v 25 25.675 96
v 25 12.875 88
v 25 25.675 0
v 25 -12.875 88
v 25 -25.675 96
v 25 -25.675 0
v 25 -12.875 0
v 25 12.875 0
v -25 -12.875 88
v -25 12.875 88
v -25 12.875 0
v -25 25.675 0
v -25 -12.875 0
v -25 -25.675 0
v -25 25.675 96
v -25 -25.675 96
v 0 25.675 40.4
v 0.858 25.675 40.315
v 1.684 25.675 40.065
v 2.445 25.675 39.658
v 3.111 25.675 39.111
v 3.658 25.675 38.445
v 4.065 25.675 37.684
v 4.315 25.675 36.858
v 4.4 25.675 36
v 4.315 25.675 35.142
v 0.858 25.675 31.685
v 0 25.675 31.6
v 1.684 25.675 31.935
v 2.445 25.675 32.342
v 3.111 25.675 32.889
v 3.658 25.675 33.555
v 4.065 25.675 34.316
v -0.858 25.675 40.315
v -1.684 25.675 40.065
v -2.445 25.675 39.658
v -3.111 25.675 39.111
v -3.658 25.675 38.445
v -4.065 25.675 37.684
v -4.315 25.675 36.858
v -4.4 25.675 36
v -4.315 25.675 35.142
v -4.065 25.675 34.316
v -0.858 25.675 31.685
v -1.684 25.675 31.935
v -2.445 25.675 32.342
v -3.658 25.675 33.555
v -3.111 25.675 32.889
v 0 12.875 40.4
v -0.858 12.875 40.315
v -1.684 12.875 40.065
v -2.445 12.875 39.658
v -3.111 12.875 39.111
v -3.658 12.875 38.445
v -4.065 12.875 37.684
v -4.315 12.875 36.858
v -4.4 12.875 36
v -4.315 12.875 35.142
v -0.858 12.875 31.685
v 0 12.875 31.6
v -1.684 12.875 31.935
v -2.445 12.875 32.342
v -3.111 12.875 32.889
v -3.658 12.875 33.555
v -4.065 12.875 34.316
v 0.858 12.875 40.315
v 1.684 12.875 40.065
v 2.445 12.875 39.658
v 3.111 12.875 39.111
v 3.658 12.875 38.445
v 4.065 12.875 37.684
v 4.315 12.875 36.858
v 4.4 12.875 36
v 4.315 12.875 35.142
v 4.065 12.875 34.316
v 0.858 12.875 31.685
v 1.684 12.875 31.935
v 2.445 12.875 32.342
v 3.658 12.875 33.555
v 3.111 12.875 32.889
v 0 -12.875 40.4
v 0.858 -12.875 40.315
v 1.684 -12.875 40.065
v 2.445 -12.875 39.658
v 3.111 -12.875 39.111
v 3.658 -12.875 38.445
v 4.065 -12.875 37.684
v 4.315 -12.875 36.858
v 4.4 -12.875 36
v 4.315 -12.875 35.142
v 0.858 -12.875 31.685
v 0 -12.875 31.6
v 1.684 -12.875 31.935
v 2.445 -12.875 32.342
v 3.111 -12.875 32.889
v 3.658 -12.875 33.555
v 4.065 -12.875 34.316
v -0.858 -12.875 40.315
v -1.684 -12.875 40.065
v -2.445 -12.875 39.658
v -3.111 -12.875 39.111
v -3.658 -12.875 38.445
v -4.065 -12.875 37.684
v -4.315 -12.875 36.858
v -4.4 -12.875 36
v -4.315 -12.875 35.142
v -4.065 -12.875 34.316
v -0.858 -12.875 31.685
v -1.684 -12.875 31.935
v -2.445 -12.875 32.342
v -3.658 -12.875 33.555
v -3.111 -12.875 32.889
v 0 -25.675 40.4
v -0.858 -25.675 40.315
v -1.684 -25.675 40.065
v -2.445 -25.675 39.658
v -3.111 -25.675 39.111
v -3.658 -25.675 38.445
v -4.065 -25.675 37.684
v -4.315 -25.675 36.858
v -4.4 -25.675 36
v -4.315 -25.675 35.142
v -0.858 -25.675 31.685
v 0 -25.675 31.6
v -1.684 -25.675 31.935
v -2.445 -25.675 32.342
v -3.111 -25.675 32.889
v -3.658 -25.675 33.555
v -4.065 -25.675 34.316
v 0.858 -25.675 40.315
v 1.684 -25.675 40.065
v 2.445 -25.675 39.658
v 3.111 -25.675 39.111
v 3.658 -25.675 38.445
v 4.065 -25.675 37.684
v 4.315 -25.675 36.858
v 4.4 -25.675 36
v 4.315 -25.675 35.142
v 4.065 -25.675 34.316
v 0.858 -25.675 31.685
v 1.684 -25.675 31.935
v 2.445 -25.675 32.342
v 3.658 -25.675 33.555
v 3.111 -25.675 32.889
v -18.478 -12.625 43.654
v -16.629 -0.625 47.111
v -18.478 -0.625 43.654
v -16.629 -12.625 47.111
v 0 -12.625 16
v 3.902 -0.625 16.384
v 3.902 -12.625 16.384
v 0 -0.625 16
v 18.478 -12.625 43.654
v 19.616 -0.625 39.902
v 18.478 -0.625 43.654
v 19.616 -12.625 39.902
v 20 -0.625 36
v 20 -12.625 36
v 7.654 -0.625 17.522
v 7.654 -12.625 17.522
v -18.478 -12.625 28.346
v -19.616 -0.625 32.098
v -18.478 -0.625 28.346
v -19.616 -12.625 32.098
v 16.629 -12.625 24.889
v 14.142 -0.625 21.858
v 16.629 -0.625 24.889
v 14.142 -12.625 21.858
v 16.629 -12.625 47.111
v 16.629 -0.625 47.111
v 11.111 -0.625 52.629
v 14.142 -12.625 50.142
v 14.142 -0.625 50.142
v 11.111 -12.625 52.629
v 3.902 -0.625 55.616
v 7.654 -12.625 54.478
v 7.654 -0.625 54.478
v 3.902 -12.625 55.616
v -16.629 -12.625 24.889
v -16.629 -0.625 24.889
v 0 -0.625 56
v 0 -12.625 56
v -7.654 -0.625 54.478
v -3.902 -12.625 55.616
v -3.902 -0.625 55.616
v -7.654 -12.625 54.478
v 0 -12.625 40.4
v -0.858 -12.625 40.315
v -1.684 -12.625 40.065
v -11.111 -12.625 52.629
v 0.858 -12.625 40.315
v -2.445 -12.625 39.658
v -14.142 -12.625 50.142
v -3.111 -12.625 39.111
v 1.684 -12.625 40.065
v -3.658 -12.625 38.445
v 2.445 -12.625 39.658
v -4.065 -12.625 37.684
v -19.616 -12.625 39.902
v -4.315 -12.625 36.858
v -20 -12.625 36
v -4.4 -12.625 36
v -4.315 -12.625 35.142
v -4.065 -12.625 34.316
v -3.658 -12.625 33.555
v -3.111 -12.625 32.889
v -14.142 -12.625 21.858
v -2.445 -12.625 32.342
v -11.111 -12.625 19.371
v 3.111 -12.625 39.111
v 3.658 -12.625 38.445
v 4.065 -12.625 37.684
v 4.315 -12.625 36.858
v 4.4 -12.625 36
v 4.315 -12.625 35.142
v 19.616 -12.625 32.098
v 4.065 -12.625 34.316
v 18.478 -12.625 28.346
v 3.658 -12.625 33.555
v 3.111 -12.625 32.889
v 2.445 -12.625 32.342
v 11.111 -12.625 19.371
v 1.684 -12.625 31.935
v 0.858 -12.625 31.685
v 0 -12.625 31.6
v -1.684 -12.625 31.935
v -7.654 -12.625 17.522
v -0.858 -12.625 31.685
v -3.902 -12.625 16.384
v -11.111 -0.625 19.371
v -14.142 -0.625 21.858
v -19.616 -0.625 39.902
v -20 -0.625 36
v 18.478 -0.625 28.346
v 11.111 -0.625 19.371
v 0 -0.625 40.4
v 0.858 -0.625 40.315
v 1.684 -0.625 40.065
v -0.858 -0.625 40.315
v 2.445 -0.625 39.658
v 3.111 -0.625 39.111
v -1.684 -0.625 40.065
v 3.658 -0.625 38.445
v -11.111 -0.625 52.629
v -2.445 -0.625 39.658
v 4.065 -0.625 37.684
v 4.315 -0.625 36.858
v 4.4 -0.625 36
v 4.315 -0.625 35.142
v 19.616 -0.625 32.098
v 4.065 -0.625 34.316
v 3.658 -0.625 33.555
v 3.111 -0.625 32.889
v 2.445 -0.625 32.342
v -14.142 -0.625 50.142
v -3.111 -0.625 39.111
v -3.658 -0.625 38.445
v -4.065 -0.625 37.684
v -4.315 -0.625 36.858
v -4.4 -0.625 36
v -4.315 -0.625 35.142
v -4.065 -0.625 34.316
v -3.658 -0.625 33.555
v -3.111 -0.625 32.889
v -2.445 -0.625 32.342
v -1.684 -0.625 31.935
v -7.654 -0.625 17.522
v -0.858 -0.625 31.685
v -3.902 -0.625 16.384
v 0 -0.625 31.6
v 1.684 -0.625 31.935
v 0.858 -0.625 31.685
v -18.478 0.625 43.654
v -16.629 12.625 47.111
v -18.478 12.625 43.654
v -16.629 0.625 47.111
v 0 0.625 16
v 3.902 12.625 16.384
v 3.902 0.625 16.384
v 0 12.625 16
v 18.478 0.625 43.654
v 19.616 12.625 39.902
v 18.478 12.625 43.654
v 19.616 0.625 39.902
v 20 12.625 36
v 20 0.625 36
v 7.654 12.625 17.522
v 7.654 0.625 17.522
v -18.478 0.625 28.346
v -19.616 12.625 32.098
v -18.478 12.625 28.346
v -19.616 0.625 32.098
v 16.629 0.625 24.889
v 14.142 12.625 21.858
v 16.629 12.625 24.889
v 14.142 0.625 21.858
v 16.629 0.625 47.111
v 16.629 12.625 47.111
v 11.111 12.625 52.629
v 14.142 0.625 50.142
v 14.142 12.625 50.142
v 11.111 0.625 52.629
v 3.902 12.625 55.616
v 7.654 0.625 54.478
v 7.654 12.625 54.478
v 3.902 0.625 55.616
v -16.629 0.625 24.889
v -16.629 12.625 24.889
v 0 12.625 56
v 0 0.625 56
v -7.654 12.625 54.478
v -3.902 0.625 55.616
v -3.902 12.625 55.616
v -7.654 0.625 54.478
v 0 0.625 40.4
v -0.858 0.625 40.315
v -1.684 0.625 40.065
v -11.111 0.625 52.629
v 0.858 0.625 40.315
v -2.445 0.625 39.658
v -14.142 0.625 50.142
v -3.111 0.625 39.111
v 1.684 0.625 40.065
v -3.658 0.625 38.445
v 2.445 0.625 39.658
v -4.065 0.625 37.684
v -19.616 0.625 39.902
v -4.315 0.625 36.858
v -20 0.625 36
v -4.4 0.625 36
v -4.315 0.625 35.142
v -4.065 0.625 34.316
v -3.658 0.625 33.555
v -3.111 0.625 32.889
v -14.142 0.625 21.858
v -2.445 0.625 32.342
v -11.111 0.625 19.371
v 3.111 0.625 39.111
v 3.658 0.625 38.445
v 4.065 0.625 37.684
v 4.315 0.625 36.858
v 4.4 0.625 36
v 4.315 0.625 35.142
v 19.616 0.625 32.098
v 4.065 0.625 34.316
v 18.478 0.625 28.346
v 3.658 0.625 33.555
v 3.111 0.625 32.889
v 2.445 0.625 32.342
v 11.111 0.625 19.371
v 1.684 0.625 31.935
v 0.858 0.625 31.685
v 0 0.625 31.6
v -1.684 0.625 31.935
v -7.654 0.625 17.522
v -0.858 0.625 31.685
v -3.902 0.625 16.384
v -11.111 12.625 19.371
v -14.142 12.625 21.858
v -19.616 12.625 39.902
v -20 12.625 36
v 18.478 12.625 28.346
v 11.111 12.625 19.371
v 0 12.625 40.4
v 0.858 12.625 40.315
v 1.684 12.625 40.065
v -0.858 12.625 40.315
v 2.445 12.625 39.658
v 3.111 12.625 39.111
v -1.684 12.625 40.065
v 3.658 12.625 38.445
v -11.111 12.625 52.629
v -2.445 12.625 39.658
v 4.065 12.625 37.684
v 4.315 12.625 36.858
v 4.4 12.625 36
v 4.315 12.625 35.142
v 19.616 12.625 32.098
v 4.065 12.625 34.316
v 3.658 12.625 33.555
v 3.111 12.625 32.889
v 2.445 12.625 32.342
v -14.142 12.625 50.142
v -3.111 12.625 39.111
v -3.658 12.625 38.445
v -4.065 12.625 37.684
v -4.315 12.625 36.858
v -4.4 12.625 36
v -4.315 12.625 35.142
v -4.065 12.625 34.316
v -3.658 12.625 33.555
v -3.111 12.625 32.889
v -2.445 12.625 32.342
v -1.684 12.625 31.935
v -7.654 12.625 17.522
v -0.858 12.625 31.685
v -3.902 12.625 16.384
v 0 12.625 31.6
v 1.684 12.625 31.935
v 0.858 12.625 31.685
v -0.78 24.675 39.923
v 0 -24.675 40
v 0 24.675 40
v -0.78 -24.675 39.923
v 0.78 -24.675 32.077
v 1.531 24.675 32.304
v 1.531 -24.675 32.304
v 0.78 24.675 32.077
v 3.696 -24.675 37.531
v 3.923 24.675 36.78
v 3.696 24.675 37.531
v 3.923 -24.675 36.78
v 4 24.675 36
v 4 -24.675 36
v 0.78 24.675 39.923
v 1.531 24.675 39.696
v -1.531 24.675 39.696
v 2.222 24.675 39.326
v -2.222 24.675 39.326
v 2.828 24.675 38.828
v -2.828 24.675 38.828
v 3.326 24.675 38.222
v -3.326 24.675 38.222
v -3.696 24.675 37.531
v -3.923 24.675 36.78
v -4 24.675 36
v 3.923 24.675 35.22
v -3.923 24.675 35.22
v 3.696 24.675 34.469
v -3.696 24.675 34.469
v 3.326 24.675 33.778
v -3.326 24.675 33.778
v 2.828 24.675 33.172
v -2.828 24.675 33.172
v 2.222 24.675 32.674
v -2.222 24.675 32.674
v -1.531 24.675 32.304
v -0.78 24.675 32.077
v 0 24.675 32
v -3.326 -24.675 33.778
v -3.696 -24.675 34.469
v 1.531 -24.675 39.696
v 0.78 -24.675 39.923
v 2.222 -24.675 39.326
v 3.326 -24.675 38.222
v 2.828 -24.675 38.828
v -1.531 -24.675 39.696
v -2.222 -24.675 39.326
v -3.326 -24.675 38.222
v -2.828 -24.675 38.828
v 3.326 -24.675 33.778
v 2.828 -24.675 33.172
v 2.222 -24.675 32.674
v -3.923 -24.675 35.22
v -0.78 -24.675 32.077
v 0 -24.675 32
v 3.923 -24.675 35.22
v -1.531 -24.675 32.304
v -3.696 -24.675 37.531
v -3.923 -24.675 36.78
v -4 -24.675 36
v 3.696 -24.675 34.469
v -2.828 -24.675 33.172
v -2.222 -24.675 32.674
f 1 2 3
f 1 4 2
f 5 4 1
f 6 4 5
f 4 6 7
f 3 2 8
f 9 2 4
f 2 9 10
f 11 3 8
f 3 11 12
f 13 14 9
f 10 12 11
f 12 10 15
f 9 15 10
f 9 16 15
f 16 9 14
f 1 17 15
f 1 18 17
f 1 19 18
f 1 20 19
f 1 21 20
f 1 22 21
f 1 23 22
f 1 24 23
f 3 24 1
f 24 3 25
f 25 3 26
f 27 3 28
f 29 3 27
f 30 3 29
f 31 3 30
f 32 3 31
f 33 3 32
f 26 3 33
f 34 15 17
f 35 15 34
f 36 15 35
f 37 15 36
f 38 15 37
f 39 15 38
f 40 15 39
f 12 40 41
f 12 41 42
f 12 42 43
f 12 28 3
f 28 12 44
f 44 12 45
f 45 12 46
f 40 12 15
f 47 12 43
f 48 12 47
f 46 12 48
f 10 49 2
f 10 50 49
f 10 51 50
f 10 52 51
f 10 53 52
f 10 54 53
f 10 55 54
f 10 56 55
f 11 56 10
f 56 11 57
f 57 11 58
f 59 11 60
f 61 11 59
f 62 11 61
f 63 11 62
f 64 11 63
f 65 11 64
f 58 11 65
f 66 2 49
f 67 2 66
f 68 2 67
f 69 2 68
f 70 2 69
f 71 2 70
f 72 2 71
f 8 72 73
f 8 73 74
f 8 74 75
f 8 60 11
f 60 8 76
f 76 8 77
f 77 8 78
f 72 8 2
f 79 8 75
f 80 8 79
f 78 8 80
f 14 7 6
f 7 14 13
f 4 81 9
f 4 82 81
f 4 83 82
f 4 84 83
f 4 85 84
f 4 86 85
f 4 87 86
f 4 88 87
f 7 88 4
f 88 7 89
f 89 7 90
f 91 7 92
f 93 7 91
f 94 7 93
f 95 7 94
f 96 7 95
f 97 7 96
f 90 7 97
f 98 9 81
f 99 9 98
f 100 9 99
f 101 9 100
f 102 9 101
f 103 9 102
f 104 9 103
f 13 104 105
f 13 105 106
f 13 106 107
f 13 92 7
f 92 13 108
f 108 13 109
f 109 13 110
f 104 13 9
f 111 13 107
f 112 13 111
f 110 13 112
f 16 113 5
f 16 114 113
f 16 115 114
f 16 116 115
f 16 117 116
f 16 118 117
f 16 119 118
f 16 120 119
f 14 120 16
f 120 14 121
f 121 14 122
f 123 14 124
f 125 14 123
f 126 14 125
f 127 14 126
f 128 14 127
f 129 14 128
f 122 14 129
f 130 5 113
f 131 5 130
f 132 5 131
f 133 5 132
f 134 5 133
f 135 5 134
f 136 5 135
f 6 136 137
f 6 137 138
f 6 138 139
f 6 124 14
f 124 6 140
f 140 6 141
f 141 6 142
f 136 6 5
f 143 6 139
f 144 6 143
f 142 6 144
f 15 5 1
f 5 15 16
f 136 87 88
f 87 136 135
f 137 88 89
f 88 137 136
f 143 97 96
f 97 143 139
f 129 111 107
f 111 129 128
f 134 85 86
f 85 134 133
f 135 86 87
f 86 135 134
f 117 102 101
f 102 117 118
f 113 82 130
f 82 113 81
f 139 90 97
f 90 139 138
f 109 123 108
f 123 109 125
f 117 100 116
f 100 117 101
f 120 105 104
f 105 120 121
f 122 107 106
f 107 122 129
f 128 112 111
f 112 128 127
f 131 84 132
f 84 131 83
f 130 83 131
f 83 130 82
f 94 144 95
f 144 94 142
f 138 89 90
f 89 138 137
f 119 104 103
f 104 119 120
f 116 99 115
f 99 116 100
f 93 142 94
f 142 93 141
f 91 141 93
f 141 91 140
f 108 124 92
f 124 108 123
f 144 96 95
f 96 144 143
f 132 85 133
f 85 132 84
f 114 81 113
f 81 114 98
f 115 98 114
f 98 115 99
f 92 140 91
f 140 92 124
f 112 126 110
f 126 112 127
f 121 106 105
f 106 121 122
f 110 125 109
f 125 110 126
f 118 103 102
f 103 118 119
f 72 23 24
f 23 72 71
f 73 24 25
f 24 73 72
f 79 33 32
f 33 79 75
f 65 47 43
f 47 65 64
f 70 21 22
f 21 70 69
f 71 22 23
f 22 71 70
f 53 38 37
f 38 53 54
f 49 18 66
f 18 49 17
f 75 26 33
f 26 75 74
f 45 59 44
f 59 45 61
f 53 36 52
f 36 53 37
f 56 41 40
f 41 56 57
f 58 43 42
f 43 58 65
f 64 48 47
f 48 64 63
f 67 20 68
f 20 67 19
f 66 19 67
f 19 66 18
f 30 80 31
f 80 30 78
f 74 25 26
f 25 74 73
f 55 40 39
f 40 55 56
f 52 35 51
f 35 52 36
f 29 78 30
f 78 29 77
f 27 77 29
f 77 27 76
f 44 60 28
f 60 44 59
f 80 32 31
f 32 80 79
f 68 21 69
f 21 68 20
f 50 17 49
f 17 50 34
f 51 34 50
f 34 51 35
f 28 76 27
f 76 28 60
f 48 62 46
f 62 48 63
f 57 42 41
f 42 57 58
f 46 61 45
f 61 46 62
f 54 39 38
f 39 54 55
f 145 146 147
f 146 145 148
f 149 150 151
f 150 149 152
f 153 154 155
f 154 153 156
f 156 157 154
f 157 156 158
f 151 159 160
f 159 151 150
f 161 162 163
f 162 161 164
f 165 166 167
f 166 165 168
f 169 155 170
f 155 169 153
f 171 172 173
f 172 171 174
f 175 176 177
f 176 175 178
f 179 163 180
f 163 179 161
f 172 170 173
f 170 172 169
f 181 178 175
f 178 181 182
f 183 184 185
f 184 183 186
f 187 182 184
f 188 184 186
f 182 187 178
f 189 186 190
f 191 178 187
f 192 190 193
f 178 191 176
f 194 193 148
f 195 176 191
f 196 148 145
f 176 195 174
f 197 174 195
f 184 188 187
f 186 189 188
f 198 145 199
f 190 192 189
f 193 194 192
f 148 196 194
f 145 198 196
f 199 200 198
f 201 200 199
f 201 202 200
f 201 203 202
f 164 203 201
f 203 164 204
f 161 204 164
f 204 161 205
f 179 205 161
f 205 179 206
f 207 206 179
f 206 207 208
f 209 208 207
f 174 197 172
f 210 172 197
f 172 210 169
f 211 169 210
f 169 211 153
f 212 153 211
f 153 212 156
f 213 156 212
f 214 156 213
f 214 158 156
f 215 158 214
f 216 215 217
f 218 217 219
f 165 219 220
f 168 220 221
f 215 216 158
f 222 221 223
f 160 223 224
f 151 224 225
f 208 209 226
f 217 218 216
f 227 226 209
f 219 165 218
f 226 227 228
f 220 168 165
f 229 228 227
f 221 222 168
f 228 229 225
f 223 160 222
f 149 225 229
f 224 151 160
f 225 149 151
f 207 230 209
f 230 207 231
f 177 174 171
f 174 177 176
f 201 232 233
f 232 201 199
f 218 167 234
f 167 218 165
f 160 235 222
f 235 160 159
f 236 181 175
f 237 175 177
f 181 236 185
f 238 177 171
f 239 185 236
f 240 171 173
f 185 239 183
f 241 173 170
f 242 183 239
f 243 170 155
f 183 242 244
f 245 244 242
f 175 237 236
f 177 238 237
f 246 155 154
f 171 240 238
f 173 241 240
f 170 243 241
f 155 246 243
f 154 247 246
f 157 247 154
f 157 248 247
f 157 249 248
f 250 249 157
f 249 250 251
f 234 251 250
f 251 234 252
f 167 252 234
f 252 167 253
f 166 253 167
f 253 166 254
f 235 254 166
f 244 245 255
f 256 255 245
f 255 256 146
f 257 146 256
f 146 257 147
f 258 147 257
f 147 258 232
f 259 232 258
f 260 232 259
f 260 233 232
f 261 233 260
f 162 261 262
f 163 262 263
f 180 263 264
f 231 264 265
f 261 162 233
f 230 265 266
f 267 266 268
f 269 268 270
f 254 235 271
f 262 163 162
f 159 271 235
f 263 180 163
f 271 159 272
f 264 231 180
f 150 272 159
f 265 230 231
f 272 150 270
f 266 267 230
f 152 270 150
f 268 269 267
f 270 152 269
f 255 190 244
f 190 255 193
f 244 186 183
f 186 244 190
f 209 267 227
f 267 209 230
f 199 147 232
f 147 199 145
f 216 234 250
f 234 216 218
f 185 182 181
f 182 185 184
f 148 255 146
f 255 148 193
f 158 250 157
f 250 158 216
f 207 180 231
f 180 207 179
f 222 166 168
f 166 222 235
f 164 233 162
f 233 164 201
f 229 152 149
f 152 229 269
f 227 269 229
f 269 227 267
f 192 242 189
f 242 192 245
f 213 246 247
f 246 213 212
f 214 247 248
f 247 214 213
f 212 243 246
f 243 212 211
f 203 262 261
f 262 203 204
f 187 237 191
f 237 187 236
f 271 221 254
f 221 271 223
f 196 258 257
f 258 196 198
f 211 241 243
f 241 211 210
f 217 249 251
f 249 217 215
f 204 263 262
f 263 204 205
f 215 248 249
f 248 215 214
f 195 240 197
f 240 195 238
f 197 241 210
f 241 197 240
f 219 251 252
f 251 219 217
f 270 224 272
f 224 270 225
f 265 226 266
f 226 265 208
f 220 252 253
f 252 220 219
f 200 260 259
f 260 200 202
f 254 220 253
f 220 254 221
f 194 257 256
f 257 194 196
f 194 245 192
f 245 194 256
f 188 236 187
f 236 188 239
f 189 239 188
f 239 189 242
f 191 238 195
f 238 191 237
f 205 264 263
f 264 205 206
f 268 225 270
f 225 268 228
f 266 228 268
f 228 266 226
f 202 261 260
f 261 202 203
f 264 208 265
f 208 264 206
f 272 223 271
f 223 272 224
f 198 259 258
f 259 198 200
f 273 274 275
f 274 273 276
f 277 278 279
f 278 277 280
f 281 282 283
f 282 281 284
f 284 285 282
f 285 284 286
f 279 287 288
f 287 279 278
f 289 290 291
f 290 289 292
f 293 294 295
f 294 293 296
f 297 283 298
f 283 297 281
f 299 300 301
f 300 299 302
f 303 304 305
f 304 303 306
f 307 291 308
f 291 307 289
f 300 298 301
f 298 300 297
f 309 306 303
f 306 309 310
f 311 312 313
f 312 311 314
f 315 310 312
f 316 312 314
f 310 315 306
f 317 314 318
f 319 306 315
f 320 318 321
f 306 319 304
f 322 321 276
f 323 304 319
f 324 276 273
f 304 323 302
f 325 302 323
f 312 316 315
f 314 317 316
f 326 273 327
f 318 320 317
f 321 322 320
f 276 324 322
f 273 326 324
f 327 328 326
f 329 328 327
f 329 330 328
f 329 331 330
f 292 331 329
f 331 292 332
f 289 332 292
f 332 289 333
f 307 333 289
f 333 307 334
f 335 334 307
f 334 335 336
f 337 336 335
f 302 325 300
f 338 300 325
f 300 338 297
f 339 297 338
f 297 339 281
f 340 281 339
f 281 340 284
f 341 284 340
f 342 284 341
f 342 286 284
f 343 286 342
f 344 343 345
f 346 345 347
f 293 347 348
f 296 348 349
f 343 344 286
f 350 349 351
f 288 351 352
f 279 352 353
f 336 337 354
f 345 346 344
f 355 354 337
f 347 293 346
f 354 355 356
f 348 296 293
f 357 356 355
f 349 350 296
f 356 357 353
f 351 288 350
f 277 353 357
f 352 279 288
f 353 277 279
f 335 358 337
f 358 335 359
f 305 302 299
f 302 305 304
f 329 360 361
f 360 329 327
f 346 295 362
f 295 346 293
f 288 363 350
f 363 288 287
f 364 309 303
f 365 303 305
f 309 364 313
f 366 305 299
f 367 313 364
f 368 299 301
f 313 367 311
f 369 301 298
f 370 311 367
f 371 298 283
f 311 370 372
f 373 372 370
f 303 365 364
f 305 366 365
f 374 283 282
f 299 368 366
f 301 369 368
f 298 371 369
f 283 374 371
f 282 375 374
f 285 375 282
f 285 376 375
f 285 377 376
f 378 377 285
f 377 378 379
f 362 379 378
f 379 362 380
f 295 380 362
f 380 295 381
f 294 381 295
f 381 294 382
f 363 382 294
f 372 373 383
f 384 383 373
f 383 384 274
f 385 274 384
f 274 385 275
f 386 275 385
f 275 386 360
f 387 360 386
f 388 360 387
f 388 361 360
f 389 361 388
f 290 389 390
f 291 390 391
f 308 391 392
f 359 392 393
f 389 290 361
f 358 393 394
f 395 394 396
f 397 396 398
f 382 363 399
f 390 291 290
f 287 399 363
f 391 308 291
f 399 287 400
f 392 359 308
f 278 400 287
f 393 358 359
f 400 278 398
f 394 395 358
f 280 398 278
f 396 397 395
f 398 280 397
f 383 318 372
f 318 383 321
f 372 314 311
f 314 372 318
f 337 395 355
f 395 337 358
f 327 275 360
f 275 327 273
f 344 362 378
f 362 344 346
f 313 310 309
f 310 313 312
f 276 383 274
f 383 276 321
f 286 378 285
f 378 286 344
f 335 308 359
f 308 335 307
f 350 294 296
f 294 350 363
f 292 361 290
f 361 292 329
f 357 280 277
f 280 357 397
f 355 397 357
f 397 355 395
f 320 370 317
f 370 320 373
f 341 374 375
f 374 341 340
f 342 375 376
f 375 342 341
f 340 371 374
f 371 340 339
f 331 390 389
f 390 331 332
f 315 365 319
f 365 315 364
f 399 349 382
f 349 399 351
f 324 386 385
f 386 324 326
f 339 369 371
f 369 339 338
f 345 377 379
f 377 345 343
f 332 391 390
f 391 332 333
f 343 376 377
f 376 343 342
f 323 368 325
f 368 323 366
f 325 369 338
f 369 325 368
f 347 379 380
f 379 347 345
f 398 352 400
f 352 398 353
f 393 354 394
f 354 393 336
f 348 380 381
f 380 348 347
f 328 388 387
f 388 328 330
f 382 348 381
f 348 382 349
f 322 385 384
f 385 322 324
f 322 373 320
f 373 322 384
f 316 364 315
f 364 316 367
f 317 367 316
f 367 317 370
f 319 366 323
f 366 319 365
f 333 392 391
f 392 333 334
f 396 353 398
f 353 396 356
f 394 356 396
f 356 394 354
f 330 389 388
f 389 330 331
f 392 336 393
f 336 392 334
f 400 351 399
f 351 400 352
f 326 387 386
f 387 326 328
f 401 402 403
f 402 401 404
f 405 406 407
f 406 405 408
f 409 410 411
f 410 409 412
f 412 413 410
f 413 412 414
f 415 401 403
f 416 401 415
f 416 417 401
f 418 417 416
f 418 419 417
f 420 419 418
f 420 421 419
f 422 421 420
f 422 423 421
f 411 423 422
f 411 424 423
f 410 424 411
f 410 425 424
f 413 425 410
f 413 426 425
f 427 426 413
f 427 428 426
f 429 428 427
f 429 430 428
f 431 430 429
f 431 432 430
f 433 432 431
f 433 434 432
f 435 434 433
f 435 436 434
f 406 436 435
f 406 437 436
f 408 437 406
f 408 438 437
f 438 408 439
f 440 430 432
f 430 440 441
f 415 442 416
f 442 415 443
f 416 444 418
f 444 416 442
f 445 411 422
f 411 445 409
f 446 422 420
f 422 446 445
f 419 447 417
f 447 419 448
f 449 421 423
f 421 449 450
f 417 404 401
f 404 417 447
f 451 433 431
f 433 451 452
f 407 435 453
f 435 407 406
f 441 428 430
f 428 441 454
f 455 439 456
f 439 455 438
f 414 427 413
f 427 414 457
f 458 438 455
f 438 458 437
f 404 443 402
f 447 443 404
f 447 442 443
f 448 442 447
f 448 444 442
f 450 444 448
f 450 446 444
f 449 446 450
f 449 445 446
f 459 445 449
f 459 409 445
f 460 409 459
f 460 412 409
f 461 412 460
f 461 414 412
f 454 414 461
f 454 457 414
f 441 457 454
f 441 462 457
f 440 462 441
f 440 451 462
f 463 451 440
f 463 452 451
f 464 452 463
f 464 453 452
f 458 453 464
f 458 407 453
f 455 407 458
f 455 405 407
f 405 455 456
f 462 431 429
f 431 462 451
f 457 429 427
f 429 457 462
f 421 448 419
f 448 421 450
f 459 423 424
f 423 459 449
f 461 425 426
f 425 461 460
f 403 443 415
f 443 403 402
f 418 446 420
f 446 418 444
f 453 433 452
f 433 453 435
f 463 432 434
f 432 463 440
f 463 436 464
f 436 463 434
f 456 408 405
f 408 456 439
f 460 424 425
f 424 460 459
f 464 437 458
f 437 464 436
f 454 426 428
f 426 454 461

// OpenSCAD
$fn = 32;

// ------------------------------------------------------------------------
// Trolley wheel set: wheels d40, fork 88 mm tall
// Every part is its own module, assembly() places every instance.
// ------------------------------------------------------------------------

// --- part 1 ---
module trolley_fork() {
  difference() {
    union() {
      translate([-25, 12.875, 0]) cube([50, 12.8, 88]);
      translate([-25, -25.675, 0]) cube([50, 12.8, 88]);
      translate([-25, -25.675, 88]) cube([50, 51.35, 8]);
    }
    translate([0, -19.275, 36]) rotate([90, 0, 0]) cylinder(h = 14.8, d = 8.8, center = true);
    translate([0, 19.275, 36]) rotate([90, 0, 0]) cylinder(h = 14.8, d = 8.8, center = true);
  }
}

// --- part 2 ---
module trolley_wheel() {
  difference() {
      translate([0, 0, 0]) cylinder(h = 12, d = 40);
      translate([0, 0, -1]) cylinder(h = 14, d = 8.8);
    }
}

// --- part 3 ---
module trolley_axle() {
  translate([0, 0, -24.675]) cylinder(h = 49.35, d = 8);
}

// --- assembly ---
module assembly() {
  color([0.80, 0.24, 0.20]) translate([0, 0, 0]) rotate([0, 0, 0]) trolley_fork();
  color([0.20, 0.45, 0.75]) translate([0, -0.625, 36]) rotate([90, 0, 0]) trolley_wheel();
  color([0.25, 0.62, 0.32]) translate([0, 12.625, 36]) rotate([90, 0, 0]) trolley_wheel();
  color([0.92, 0.70, 0.18]) translate([0, 0, 36]) rotate([90, 0, 0]) trolley_axle();
}

assembly();
